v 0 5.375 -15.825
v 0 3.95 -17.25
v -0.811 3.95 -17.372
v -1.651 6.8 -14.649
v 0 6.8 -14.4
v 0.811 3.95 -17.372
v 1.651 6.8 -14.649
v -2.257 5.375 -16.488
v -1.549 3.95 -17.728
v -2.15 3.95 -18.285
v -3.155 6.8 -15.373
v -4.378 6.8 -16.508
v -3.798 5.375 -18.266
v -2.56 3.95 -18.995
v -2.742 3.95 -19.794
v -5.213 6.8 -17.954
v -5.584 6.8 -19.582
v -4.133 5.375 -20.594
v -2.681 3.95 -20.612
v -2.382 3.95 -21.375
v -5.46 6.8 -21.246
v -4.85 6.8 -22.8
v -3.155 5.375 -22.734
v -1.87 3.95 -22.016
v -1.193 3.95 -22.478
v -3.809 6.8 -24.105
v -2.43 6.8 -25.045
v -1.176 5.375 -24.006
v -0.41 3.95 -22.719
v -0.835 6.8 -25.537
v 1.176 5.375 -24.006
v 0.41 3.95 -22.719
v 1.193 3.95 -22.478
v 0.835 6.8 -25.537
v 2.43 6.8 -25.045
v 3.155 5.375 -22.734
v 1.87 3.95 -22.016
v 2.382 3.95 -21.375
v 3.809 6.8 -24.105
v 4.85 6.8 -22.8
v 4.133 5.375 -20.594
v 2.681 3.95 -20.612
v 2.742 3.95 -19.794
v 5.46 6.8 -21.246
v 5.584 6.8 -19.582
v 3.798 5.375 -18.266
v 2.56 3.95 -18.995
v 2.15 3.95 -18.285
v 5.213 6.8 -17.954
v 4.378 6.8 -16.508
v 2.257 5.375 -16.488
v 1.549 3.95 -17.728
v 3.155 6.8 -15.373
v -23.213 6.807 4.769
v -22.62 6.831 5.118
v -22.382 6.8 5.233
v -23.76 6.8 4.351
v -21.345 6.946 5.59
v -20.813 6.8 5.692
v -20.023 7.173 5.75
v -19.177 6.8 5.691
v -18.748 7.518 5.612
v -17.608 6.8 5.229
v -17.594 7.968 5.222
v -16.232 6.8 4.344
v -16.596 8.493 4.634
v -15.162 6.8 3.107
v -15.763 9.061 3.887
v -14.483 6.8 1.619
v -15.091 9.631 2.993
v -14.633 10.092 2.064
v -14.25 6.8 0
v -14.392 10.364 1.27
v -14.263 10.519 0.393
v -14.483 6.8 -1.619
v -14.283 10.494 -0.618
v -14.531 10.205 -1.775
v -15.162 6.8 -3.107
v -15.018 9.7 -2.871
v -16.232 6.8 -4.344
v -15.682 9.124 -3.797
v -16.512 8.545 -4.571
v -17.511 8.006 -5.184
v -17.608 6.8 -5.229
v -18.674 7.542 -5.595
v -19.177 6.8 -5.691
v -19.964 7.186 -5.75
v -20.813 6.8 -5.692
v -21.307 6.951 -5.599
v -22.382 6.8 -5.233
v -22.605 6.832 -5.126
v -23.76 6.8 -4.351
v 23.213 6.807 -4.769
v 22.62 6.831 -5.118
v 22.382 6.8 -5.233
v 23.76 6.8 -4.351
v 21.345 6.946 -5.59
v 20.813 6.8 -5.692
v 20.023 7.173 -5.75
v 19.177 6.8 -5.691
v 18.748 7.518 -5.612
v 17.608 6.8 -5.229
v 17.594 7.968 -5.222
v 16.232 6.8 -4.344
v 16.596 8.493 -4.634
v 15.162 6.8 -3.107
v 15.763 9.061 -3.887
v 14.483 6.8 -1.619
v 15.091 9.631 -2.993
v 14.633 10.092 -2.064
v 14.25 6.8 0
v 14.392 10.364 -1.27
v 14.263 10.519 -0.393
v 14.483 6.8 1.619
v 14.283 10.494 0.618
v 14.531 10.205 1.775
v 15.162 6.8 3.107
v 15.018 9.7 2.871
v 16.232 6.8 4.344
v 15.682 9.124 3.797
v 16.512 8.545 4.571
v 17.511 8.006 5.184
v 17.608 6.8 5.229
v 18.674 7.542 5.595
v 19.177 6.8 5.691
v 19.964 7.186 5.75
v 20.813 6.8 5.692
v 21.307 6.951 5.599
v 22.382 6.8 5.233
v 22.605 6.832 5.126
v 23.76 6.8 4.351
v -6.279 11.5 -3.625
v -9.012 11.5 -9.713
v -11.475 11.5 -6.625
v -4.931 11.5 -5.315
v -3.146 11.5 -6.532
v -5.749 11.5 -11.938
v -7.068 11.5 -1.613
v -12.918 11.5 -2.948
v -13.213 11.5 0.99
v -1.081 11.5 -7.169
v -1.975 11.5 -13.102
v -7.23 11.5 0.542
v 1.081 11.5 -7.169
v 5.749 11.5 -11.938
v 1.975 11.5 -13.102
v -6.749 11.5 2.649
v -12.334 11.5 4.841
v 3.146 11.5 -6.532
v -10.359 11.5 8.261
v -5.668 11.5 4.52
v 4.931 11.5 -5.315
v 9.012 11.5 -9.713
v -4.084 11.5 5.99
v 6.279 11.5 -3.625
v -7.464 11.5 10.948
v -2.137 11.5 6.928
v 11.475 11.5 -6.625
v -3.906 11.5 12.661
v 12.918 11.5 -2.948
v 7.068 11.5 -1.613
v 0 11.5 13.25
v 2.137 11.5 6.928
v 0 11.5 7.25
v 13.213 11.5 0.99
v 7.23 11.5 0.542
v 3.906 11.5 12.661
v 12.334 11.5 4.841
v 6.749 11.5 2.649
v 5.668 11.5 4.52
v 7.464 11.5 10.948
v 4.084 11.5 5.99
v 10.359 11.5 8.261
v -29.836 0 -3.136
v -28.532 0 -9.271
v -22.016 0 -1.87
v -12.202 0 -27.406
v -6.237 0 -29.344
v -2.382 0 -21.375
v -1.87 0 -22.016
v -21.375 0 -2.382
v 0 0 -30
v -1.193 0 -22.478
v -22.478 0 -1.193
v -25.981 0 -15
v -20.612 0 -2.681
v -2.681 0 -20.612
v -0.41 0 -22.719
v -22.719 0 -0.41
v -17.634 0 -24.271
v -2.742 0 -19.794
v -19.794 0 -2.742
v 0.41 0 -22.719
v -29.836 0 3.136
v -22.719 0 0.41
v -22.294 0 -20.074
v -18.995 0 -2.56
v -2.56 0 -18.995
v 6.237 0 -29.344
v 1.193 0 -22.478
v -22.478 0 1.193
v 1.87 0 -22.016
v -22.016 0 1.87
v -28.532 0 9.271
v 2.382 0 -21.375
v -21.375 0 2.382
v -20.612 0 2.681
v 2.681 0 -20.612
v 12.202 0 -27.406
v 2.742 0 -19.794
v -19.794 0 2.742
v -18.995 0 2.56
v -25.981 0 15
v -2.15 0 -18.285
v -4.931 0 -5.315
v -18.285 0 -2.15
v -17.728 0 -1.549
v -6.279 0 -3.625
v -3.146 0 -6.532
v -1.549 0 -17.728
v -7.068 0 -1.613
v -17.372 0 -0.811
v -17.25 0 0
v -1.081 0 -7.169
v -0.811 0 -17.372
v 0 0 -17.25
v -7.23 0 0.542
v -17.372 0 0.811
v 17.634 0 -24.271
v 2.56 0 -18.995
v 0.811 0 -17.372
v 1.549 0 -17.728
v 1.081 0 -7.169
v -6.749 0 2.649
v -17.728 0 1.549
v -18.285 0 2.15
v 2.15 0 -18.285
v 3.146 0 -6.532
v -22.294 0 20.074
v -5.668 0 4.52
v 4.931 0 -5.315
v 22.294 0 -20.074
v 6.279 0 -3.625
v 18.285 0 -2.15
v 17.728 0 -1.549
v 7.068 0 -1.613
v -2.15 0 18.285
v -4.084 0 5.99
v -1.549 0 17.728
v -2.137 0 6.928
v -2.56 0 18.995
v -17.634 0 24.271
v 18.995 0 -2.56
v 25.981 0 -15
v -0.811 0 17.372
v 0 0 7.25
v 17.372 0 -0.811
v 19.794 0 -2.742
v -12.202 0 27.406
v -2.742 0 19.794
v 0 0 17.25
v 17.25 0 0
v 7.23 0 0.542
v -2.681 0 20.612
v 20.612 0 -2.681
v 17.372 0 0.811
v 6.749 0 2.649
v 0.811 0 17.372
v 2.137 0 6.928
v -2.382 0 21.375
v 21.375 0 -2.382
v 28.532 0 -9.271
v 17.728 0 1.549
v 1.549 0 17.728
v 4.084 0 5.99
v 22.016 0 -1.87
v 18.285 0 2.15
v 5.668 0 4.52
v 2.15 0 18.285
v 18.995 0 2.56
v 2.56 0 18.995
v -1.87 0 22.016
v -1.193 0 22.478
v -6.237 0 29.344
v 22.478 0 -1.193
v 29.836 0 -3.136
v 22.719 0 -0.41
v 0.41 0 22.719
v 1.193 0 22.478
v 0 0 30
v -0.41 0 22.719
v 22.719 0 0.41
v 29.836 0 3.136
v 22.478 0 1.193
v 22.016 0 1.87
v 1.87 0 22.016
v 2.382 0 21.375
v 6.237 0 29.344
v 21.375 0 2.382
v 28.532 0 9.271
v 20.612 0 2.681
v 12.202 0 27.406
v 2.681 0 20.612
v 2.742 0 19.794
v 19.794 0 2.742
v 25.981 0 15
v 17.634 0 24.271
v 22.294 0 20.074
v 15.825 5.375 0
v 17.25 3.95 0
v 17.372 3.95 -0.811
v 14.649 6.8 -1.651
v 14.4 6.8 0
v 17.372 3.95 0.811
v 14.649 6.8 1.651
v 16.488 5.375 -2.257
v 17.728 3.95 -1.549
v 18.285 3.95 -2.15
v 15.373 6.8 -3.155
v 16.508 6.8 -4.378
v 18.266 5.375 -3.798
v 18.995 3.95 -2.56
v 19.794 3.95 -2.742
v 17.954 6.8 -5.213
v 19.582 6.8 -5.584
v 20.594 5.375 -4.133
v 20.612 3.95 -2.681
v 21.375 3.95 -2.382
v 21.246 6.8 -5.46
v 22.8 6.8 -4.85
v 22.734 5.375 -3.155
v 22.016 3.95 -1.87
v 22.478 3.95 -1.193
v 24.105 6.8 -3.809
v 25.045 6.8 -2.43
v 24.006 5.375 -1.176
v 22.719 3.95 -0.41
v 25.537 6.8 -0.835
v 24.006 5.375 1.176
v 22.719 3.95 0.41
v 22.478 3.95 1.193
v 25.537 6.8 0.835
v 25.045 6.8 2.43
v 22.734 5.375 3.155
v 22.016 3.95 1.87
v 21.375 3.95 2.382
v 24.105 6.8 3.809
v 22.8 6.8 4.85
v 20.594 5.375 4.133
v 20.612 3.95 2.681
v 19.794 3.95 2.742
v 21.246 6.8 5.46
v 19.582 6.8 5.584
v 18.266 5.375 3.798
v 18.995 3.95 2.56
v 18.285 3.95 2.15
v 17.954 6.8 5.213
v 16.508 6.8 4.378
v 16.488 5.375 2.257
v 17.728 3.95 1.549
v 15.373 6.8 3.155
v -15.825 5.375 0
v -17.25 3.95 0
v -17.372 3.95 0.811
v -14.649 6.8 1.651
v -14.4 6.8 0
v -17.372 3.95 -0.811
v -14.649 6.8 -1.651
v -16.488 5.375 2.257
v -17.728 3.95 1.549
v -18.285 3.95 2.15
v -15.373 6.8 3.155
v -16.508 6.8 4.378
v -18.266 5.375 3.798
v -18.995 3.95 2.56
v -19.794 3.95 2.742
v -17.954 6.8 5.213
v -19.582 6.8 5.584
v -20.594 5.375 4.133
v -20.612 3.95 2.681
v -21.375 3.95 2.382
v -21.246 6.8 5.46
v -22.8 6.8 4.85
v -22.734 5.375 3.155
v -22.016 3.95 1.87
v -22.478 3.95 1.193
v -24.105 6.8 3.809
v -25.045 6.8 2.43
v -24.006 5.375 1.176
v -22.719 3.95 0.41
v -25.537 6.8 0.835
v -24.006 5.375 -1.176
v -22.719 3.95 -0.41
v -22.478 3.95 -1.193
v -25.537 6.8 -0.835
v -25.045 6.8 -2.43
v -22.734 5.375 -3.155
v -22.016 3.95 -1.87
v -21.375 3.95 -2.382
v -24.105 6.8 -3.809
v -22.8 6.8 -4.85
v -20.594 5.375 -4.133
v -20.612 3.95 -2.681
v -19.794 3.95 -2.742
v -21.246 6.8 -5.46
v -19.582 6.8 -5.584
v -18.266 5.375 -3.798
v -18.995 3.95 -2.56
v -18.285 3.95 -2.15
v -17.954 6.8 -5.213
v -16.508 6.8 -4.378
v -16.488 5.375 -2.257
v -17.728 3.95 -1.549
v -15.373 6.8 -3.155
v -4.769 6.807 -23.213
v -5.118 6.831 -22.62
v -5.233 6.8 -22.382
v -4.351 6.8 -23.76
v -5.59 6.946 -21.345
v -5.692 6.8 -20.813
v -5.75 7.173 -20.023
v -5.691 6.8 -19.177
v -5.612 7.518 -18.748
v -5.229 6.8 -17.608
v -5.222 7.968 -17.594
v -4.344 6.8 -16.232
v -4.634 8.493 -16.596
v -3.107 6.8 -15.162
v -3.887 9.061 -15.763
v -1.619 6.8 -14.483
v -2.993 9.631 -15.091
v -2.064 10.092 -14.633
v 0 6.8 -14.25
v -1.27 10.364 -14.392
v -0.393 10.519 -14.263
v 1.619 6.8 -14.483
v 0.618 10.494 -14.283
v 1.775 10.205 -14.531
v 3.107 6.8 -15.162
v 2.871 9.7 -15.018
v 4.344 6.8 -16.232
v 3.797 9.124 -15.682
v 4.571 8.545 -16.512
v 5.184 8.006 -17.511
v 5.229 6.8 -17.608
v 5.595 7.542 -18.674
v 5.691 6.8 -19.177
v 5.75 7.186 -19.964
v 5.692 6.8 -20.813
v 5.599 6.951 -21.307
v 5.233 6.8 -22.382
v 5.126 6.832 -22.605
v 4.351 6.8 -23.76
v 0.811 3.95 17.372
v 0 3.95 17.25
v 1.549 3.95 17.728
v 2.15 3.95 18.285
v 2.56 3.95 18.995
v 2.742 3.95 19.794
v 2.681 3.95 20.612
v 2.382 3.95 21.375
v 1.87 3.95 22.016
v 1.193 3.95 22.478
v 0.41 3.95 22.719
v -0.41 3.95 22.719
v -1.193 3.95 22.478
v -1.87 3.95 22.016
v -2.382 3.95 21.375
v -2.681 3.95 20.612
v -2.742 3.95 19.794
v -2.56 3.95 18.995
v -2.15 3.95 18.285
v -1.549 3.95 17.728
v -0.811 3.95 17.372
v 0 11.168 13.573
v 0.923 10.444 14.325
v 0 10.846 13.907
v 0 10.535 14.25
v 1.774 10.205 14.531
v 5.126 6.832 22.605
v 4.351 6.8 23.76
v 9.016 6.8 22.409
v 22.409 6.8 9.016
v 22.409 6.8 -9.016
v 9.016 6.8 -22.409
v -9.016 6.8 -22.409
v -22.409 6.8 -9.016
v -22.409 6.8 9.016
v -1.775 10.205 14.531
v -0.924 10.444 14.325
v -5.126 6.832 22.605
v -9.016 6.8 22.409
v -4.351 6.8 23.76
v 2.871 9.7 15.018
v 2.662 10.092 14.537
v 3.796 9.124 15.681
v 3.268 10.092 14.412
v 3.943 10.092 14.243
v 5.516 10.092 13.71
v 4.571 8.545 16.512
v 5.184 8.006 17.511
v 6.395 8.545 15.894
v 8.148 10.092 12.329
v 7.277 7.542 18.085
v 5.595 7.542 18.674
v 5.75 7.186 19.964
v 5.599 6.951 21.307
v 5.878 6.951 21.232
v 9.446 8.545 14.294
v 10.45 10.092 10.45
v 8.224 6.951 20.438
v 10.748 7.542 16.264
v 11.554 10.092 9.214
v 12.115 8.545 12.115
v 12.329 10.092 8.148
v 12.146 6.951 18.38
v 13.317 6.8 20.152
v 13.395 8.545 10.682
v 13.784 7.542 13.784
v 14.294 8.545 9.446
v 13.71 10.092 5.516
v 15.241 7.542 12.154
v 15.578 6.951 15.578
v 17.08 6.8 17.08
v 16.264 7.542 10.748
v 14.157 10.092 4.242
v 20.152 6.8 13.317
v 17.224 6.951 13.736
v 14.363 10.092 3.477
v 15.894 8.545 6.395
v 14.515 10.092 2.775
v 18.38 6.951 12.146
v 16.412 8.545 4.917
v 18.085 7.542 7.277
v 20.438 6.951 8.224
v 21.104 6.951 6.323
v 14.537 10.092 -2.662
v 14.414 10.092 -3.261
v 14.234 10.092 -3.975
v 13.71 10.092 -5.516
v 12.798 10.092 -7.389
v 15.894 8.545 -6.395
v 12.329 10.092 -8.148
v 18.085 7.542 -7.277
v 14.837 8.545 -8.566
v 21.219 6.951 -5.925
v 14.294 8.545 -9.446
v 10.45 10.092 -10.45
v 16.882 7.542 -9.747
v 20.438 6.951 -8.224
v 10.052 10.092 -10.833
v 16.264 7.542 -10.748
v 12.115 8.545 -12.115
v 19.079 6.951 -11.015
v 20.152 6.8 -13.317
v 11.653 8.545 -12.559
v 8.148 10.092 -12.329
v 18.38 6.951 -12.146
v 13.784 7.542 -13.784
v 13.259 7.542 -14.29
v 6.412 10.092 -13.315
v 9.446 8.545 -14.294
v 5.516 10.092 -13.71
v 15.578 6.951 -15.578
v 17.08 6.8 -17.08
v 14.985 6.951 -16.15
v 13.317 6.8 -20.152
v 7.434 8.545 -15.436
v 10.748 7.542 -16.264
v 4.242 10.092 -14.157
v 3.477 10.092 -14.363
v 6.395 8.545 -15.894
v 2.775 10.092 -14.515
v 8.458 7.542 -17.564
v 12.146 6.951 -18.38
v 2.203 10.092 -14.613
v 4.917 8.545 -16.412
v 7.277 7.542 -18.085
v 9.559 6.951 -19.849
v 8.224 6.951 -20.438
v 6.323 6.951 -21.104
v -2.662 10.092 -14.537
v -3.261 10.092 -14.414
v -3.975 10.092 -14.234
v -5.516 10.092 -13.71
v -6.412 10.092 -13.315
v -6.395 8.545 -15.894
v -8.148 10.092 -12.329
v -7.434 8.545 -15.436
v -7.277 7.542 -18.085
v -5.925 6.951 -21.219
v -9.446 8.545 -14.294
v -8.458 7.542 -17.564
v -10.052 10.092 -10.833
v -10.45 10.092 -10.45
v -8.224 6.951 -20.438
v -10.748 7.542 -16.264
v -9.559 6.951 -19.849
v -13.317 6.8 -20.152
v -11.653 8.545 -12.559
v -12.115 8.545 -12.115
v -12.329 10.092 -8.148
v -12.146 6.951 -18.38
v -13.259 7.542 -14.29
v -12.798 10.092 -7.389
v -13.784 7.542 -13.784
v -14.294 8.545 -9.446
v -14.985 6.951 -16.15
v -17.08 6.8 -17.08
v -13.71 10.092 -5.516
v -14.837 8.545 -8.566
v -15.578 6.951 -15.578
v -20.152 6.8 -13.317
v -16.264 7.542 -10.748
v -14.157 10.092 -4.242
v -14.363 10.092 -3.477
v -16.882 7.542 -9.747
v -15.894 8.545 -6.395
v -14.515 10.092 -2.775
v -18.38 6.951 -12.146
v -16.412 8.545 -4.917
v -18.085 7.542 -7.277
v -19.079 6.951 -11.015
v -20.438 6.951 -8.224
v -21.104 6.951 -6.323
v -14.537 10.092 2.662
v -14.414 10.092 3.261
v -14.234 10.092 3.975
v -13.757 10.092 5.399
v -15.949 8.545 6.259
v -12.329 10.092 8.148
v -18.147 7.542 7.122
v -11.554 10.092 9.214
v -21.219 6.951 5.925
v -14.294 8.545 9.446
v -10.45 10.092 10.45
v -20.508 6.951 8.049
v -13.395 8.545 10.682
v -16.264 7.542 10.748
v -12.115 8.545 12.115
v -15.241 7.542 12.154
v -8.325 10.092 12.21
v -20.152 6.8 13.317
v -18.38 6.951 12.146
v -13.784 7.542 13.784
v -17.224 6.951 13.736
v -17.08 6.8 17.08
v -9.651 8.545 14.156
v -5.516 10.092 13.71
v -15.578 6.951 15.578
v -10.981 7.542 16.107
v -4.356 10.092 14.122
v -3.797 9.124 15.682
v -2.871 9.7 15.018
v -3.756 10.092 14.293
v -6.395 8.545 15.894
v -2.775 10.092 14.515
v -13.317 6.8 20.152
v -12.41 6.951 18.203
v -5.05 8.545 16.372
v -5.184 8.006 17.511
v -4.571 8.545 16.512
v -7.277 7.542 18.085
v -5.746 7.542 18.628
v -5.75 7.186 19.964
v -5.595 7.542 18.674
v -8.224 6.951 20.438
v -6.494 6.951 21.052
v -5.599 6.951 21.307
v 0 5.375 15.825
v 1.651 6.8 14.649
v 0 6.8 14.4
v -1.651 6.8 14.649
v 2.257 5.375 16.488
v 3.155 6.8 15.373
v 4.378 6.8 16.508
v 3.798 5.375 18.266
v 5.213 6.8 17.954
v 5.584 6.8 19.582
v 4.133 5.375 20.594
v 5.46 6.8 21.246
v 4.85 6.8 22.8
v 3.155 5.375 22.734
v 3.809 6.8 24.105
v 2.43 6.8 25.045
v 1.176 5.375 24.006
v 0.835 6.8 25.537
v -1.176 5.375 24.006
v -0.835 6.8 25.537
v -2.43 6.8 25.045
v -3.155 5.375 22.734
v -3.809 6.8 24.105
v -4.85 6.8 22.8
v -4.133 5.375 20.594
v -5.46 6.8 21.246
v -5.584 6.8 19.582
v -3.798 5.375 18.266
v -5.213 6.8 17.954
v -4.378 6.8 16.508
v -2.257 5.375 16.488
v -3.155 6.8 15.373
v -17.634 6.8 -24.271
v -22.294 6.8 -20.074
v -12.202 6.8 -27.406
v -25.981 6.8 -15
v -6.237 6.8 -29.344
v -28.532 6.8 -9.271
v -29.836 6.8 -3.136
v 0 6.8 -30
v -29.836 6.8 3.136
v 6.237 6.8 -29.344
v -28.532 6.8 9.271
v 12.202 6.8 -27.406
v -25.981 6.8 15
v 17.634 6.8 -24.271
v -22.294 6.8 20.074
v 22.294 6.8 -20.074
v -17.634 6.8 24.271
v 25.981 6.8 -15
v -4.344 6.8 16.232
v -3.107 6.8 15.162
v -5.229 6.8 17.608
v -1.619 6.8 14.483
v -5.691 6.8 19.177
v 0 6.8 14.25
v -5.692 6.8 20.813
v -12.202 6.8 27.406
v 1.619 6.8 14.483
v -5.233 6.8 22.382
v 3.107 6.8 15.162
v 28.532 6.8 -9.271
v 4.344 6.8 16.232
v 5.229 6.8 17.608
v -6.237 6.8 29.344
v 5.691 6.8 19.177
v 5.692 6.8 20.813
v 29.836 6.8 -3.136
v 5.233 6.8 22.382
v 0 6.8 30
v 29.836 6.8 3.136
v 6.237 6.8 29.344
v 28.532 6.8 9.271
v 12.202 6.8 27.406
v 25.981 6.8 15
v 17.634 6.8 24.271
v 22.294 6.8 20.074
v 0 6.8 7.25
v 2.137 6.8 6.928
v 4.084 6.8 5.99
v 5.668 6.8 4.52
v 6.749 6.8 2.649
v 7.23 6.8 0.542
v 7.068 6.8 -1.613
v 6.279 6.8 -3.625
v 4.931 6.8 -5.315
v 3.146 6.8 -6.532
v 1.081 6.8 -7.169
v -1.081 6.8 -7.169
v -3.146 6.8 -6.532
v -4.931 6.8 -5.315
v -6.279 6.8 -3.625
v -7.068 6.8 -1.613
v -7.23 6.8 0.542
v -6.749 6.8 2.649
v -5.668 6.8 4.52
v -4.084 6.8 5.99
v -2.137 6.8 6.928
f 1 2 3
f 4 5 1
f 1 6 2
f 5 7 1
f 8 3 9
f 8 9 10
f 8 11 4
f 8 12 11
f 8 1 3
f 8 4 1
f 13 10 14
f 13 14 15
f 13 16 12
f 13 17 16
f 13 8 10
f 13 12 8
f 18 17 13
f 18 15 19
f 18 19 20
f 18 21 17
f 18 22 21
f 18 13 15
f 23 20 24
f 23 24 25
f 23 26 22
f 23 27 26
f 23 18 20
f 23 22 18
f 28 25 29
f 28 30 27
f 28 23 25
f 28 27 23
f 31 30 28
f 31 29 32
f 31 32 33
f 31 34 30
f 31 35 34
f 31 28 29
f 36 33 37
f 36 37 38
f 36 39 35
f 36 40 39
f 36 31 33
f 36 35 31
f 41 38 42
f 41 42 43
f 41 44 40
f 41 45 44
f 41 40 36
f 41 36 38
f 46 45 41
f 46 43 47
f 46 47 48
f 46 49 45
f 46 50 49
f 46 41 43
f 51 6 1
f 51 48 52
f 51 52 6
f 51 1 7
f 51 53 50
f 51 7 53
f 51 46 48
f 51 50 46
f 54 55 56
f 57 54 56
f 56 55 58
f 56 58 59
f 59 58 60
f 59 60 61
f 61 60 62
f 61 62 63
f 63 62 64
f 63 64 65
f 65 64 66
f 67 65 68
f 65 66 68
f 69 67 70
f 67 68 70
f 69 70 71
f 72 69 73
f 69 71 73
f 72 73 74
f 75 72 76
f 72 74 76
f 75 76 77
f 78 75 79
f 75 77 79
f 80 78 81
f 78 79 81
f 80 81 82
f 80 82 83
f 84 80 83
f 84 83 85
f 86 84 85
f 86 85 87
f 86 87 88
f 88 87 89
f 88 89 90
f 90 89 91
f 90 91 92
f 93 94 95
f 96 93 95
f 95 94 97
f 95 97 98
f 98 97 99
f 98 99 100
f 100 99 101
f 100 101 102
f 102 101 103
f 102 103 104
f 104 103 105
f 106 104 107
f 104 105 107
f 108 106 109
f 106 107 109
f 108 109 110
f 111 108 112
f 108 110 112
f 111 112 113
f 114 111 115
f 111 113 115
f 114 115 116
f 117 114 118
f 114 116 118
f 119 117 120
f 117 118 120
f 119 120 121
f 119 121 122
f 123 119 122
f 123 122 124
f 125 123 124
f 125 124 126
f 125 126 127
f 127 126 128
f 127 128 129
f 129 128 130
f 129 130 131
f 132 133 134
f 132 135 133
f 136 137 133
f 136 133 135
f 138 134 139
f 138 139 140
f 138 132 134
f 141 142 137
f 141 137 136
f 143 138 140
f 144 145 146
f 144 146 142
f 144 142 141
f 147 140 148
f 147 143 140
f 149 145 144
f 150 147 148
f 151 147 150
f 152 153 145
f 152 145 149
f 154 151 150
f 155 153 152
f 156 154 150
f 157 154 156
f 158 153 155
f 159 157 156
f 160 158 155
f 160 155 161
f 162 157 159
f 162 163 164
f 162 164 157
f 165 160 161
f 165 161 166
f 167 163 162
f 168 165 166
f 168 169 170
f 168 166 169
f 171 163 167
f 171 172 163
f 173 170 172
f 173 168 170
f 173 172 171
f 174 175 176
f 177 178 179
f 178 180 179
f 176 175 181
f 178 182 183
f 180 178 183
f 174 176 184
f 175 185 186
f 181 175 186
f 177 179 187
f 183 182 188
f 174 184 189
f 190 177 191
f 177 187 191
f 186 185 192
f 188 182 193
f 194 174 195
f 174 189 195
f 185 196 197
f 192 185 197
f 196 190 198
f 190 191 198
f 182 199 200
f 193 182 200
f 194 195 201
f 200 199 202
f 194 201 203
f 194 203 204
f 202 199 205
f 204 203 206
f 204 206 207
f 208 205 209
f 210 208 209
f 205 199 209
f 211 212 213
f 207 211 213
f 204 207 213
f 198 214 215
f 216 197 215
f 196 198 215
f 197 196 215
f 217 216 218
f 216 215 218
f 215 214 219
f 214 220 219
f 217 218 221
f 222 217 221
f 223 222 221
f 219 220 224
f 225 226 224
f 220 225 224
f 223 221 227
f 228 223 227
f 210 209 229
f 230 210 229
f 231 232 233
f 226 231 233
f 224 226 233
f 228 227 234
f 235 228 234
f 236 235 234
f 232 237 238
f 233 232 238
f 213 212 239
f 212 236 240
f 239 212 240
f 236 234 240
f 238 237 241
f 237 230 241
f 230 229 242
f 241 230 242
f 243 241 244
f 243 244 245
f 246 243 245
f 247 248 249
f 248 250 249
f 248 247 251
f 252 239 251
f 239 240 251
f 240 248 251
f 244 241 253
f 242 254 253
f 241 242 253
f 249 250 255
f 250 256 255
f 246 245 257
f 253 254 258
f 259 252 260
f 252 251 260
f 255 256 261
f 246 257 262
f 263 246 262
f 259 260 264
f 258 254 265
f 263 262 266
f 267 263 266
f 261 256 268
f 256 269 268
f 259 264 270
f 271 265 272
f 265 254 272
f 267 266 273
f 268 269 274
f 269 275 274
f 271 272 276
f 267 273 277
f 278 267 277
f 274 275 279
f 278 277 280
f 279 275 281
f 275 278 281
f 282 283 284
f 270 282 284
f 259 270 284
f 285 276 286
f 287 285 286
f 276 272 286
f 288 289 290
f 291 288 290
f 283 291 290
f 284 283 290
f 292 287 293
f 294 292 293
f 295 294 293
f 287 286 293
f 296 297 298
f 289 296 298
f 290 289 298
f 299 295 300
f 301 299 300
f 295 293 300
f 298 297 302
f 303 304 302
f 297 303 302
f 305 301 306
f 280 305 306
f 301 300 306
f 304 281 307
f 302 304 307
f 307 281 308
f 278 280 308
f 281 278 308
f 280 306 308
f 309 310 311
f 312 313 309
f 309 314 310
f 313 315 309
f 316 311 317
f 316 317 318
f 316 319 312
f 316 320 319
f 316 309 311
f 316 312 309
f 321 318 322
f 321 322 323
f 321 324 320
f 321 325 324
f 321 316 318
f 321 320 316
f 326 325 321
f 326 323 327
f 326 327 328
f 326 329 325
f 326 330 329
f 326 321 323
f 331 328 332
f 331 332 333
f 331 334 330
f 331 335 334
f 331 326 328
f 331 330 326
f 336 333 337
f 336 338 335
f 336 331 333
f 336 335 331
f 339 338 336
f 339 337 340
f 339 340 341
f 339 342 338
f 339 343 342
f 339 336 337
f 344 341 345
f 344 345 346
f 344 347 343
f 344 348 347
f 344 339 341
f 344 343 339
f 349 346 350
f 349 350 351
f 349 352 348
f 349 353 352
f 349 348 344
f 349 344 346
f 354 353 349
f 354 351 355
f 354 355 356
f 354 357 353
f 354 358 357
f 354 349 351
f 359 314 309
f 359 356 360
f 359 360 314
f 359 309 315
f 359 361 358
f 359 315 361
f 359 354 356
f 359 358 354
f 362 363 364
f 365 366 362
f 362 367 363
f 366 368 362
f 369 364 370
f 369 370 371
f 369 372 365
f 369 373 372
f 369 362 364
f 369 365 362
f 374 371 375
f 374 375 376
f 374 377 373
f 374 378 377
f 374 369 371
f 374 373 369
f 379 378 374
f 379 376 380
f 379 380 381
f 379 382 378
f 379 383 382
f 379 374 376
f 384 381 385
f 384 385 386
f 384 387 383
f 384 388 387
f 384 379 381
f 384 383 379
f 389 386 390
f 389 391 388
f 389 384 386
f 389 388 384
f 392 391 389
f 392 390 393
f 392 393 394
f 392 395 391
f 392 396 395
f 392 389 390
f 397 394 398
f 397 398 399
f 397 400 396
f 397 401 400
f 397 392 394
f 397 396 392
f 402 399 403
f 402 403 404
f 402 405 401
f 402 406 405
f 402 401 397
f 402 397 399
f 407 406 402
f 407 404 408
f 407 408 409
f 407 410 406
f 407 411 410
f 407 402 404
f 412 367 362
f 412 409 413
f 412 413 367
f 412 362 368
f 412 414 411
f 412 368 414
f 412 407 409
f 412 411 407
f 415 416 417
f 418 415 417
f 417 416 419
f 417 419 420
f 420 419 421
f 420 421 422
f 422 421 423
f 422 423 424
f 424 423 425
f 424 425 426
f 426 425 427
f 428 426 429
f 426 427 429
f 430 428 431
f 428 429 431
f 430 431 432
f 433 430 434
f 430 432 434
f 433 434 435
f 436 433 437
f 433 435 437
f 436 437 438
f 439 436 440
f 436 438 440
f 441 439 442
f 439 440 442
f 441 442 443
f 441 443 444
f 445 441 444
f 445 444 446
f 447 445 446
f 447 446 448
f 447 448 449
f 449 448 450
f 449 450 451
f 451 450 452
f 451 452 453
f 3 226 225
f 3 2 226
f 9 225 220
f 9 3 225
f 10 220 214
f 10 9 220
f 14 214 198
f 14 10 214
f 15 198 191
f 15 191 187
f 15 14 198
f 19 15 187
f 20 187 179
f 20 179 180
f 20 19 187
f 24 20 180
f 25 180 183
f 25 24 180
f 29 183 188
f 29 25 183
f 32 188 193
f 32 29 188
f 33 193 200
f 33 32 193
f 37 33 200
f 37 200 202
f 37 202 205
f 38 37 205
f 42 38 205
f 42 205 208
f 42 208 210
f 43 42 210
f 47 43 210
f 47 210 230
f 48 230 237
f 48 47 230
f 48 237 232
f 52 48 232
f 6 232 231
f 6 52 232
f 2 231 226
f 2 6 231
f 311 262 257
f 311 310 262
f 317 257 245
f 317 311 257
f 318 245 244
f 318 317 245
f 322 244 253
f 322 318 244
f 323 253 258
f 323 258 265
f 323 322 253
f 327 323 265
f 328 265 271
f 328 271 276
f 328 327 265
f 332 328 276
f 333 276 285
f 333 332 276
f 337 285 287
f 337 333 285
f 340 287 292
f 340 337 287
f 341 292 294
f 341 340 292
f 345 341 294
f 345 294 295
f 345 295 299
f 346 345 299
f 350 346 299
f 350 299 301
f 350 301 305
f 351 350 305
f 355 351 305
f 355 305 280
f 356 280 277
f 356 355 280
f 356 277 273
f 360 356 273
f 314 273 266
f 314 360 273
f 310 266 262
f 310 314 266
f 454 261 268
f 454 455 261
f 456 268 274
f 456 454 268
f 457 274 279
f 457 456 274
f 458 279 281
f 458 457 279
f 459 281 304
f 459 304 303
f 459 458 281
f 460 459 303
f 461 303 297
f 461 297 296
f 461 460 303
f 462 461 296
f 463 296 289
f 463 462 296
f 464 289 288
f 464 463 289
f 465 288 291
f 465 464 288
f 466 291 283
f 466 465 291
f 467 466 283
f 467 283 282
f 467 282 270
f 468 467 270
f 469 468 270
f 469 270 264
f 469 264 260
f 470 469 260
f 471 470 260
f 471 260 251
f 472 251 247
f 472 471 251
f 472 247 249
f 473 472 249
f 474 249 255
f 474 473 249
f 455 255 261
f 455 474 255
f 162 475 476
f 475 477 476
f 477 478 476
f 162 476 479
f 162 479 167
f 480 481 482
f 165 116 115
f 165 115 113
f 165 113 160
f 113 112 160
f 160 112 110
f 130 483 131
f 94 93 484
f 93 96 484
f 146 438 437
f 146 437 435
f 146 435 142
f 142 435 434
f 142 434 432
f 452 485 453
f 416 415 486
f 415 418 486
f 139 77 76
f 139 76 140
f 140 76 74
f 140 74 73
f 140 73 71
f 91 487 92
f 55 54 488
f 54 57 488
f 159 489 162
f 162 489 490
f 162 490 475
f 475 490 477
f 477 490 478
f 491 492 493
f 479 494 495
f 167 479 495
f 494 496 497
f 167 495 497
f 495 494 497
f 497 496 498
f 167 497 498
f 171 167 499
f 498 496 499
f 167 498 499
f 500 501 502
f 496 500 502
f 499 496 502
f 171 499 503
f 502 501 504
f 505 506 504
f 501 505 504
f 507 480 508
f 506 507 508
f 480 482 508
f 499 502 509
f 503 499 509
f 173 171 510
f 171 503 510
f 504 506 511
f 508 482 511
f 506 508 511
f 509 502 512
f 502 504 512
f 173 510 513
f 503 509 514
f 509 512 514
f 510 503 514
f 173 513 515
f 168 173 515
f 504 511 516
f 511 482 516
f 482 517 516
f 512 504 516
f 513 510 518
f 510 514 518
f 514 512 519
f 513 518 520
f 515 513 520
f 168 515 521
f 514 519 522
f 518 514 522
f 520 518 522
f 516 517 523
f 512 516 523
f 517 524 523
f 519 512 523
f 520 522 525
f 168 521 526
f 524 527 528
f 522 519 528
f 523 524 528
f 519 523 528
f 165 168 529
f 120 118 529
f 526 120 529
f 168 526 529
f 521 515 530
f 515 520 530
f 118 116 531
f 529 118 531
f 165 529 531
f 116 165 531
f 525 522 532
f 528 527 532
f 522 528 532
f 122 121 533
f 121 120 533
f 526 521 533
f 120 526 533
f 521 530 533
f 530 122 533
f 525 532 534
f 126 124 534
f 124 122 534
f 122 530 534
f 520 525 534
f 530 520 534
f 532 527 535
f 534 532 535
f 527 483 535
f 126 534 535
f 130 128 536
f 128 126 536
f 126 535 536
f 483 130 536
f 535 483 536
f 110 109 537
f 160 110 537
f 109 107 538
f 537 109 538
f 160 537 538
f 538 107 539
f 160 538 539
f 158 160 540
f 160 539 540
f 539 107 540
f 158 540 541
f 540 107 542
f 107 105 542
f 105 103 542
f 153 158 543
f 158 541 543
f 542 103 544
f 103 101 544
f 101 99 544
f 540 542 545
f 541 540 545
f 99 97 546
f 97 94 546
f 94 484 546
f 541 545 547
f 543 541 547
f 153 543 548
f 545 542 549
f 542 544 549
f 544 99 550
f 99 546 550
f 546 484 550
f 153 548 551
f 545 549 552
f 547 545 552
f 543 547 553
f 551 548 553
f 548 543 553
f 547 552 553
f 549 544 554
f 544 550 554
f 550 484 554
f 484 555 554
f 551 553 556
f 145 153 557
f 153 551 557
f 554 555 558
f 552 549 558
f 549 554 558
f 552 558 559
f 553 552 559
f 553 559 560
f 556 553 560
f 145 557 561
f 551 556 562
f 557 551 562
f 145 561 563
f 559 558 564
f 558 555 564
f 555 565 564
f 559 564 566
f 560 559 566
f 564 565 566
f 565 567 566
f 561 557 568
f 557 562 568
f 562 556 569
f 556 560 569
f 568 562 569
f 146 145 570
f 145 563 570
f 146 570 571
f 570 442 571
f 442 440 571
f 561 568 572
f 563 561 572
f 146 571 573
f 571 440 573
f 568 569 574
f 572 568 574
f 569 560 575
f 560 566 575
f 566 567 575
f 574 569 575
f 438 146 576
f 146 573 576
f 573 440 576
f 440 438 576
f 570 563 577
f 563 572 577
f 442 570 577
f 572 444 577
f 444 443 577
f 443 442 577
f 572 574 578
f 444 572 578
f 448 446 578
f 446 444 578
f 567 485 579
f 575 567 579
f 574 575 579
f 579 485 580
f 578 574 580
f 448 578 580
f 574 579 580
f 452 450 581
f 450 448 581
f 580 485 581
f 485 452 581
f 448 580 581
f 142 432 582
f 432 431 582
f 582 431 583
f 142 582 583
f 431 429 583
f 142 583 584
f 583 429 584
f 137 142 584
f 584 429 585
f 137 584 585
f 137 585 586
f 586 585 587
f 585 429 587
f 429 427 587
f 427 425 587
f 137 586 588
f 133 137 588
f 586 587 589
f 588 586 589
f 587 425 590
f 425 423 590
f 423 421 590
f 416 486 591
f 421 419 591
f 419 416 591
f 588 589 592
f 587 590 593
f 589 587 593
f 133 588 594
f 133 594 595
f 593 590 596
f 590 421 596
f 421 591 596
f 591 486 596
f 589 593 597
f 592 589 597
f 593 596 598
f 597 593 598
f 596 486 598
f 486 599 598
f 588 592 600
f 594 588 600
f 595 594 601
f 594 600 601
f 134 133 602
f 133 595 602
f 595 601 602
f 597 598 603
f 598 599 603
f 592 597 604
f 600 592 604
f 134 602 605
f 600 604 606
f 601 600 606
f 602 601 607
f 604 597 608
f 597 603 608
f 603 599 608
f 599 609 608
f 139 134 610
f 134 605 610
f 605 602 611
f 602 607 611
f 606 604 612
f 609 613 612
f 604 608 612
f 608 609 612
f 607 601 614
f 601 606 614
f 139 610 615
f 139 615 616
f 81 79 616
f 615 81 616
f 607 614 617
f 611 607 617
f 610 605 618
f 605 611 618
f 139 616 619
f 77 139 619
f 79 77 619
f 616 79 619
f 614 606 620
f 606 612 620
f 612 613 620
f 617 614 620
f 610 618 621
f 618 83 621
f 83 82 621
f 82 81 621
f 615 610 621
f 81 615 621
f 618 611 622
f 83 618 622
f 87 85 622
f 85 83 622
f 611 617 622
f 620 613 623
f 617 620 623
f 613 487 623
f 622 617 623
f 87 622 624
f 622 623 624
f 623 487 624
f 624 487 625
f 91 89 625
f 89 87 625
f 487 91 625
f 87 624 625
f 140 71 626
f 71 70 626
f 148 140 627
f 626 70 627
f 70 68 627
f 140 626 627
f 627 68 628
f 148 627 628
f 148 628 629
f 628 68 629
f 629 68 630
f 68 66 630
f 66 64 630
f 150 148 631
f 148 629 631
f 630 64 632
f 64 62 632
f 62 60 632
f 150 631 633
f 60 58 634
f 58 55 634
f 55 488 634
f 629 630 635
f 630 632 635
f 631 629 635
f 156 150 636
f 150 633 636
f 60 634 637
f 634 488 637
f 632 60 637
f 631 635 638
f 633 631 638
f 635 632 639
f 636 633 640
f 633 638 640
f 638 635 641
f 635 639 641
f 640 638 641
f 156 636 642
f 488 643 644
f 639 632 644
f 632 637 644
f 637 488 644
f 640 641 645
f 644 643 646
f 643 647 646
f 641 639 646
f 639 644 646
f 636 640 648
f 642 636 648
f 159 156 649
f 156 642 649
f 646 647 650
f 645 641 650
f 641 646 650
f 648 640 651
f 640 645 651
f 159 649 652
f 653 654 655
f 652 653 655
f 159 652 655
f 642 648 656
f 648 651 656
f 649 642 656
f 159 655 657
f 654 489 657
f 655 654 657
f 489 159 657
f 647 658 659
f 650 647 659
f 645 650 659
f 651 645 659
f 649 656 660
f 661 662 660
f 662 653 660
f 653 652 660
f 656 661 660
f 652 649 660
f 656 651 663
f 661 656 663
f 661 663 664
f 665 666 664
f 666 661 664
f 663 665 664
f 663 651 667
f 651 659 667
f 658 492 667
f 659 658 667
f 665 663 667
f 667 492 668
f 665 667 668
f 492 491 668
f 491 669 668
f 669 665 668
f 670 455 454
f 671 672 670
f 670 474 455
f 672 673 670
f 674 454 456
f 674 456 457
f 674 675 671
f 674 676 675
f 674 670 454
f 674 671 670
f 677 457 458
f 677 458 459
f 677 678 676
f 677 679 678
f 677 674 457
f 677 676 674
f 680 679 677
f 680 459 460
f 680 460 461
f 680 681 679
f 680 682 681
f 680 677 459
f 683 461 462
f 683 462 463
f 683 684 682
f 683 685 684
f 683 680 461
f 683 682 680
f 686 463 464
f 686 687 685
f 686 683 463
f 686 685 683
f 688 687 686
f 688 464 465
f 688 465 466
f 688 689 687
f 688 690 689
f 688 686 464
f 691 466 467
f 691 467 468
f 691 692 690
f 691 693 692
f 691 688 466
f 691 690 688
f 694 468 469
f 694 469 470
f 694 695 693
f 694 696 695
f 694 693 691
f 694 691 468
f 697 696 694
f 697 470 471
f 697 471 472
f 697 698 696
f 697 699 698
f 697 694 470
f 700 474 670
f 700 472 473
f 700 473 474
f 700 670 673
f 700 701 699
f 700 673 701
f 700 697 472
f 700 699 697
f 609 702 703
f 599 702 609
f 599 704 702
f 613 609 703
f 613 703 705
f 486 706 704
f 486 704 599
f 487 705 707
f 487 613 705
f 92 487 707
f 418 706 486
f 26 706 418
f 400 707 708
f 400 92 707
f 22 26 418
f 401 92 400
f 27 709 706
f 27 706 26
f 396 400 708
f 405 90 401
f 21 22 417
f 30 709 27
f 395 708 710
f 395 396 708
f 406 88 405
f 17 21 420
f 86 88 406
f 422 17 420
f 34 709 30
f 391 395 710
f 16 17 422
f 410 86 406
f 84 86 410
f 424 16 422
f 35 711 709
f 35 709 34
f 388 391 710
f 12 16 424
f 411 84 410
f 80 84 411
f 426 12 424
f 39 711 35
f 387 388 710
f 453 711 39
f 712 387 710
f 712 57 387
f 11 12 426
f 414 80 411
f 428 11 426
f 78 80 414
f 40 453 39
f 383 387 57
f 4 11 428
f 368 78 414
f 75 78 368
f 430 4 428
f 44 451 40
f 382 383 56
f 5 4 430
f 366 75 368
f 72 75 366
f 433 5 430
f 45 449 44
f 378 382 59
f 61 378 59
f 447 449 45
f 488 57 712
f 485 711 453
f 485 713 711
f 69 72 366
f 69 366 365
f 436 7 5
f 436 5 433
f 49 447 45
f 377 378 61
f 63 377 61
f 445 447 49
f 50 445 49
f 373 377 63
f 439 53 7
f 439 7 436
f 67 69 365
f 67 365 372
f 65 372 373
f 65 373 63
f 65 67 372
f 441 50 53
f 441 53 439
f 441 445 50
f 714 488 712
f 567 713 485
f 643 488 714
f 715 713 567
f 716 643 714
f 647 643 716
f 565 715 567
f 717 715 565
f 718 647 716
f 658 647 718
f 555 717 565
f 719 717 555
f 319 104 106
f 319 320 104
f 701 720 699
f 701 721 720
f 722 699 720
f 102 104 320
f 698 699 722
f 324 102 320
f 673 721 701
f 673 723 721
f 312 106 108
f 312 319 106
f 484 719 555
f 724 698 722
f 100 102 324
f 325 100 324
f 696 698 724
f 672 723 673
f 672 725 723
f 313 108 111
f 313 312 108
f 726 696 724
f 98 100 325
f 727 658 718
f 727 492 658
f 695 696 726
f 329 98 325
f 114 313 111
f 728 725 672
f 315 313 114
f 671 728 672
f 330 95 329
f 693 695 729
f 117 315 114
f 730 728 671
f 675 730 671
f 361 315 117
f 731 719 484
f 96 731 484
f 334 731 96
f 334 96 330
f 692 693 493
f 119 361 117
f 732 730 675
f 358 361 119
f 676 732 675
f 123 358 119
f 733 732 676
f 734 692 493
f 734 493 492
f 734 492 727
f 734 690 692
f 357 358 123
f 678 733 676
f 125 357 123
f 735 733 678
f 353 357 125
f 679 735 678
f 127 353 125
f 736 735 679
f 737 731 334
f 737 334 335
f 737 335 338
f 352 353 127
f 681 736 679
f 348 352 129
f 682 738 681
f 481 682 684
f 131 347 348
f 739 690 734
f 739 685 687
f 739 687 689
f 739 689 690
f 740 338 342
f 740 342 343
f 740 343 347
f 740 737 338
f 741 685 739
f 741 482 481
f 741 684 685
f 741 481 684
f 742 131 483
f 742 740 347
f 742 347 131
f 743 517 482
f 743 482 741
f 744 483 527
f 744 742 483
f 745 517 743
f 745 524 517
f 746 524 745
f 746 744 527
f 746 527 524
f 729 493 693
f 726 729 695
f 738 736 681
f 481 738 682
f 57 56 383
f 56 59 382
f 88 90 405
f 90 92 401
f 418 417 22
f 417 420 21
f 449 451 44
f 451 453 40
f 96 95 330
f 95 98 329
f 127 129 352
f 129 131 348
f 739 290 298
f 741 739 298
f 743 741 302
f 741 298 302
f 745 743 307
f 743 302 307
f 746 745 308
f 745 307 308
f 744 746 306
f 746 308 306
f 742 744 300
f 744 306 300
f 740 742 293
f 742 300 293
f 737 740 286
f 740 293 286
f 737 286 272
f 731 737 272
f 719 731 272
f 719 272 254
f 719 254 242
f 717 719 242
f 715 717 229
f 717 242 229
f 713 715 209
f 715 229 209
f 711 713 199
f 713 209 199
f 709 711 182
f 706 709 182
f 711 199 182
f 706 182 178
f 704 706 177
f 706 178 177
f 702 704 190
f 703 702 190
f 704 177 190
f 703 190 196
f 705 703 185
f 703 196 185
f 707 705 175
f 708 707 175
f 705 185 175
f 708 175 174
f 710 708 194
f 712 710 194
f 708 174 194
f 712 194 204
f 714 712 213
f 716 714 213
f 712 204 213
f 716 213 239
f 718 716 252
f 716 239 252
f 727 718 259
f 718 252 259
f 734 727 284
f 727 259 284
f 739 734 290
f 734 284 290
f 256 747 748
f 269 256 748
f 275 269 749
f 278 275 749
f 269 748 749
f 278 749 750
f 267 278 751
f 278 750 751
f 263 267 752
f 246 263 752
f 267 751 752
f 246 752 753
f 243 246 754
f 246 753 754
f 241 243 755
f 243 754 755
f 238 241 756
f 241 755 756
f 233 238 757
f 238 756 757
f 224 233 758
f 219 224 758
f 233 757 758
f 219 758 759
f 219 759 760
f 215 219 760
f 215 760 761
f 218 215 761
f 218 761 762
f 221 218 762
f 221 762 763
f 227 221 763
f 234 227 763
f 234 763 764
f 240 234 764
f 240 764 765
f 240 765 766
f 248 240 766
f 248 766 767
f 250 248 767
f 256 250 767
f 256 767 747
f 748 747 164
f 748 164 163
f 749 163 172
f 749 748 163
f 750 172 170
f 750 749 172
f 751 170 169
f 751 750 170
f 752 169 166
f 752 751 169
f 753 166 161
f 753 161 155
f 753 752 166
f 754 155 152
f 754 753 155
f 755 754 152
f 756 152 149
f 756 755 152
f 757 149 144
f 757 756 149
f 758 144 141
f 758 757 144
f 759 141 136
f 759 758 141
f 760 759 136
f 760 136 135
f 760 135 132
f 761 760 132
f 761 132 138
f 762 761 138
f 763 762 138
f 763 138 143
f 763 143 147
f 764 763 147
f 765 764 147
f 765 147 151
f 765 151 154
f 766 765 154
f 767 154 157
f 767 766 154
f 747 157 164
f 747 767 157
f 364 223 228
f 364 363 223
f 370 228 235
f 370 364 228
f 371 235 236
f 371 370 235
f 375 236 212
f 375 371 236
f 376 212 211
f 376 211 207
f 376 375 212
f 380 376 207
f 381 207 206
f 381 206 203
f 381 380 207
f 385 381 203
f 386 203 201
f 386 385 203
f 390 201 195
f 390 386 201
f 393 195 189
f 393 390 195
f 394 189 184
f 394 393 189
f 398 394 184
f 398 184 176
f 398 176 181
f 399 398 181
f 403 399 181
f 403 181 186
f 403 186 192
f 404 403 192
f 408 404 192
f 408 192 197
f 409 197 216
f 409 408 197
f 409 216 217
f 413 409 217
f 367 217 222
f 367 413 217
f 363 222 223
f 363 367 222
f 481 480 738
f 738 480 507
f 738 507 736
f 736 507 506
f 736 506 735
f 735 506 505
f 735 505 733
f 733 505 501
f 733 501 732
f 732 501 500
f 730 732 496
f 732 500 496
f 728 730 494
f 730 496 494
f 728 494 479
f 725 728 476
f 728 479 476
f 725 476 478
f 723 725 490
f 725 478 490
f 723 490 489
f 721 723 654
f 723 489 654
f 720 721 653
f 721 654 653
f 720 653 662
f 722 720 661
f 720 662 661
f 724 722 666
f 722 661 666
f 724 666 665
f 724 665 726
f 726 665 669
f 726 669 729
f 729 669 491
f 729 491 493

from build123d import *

# Parameters (mm, degrees)
SKETCH2_R           = 30
BOSS_EXTRUDE1_DEPTH = 6.8
SKETCH3_R           = 13.25
SKETCH3_R_2         = 7.25
BOSS_EXTRUDE2_DEPTH = 4.7
FILLET1_R           = 15
SKETCH6_R           = 5.75
CUT_EXTRUDE3_DEPTH  = 4.7
CIRPATTERN1_COUNT   = 4
SKETCH7_R           = 7.25
CUT_EXTRUDE4_DEPTH  = 44.957365708


with BuildPart() as part:
    # Sketch2 → Boss-Extrude1 (new body)
    with BuildSketch(Plane(origin=(0, 0, 0), x_dir=(1, 0, 0), z_dir=(0, 1, 0))):
        with Locations(Location((0, 0, 0), (0, 0, 270))):
            Circle(SKETCH2_R)
    extrude(amount=BOSS_EXTRUDE1_DEPTH)

    # Sketch3 → Boss-Extrude2 (add)
    with BuildSketch(Plane(origin=(0, 6.8, 0), x_dir=(1, 0, 0), z_dir=(0, 1, 0))):
        with Locations(Location((0, 0, 0), (0, 0, 270))):
            Circle(SKETCH3_R)
        with Locations(Location((0, 0, 0), (0, 0, 270))):
            Circle(SKETCH3_R_2, mode=Mode.SUBTRACT)
    extrude(amount=BOSS_EXTRUDE2_DEPTH)

    # Fillet1
    # the kernel refuses this fillet: 15 mm, written as the material it adds along each edge
    with BuildSketch(Plane(origin=(0, 6.8, 0), x_dir=(0, 0, 1), z_dir=(-1, 0, 0))) as fillet1_piece_1:
        with BuildLine():
            CenterArc((24.154586191, 15), FILLET1_R, 223.366822413, 46.633177587)
            Line((13.25, 4.7), (13.031908276, 4.494))
            ThreePointArc((13.031908276, 4.494), (12.95, 2.35), (12.95, 0))
            Line((12.95, 0), (13.25, -0.3))
            Line((13.25, -0.3), (24.154586191, -0.3))
            Line((24.154586191, -0.3), (24.154586191, 0))
        make_face()
    revolve(axis=Axis((0, 6.8, 0), (0, 1, 0)))

    # Sketch9 → CSK for M5 Hex Socket Countersunk Cap Screw1 (revolve, cut)
    with BuildSketch(Plane(origin=(0, 6.8, -20), x_dir=(0, 0, 1), z_dir=(1, 0, 0))):
        Polygon((0, 0), (0, 6.8), (2.75, 6.8), (2.75, 2.85), (5.6, 0), align=None)
    csk_for_m5_hex_socket_countersunk_cap_sc = revolve(axis=Axis((0, 13.15, -20), (0, -1, 0)), mode=Mode.SUBTRACT)

    # Sketch6 → Cut-Extrude3 (cut)
    with BuildSketch(Plane(origin=(0, 11.5, 0), x_dir=(1, 0, 0), z_dir=(0, 1, 0))):
        with Locations((0, 20)):
            Circle(SKETCH6_R)
    cut_extrude3 = extrude(amount=-CUT_EXTRUDE3_DEPTH, mode=Mode.SUBTRACT)

    # CirPattern1: CSK for M5 Hex Socket Countersunk Cap Screw1, Cut-Extrude3 ×4 about axis
    cirpattern1_axis = Axis((0, 0, 0), (0, 1, 0))
    add([csk_for_m5_hex_socket_countersunk_cap_sc.rotate(cirpattern1_axis, i * 360 / CIRPATTERN1_COUNT) for i in range(1, CIRPATTERN1_COUNT)], mode=Mode.SUBTRACT)
    add([cut_extrude3.rotate(cirpattern1_axis, i * 360 / CIRPATTERN1_COUNT) for i in range(1, CIRPATTERN1_COUNT)], mode=Mode.SUBTRACT)

    # Sketch7 → Cut-Extrude4 (cut, through all)
    with BuildSketch(Plane(origin=(0, 11.5, 0), x_dir=(1, 0, 0), z_dir=(0, 1, 0))):
        with Locations(Location((0, 0, 0), (0, 0, 270))):
            Circle(SKETCH7_R)
    extrude(amount=-CUT_EXTRUDE4_DEPTH, mode=Mode.SUBTRACT)


solid = part.part
